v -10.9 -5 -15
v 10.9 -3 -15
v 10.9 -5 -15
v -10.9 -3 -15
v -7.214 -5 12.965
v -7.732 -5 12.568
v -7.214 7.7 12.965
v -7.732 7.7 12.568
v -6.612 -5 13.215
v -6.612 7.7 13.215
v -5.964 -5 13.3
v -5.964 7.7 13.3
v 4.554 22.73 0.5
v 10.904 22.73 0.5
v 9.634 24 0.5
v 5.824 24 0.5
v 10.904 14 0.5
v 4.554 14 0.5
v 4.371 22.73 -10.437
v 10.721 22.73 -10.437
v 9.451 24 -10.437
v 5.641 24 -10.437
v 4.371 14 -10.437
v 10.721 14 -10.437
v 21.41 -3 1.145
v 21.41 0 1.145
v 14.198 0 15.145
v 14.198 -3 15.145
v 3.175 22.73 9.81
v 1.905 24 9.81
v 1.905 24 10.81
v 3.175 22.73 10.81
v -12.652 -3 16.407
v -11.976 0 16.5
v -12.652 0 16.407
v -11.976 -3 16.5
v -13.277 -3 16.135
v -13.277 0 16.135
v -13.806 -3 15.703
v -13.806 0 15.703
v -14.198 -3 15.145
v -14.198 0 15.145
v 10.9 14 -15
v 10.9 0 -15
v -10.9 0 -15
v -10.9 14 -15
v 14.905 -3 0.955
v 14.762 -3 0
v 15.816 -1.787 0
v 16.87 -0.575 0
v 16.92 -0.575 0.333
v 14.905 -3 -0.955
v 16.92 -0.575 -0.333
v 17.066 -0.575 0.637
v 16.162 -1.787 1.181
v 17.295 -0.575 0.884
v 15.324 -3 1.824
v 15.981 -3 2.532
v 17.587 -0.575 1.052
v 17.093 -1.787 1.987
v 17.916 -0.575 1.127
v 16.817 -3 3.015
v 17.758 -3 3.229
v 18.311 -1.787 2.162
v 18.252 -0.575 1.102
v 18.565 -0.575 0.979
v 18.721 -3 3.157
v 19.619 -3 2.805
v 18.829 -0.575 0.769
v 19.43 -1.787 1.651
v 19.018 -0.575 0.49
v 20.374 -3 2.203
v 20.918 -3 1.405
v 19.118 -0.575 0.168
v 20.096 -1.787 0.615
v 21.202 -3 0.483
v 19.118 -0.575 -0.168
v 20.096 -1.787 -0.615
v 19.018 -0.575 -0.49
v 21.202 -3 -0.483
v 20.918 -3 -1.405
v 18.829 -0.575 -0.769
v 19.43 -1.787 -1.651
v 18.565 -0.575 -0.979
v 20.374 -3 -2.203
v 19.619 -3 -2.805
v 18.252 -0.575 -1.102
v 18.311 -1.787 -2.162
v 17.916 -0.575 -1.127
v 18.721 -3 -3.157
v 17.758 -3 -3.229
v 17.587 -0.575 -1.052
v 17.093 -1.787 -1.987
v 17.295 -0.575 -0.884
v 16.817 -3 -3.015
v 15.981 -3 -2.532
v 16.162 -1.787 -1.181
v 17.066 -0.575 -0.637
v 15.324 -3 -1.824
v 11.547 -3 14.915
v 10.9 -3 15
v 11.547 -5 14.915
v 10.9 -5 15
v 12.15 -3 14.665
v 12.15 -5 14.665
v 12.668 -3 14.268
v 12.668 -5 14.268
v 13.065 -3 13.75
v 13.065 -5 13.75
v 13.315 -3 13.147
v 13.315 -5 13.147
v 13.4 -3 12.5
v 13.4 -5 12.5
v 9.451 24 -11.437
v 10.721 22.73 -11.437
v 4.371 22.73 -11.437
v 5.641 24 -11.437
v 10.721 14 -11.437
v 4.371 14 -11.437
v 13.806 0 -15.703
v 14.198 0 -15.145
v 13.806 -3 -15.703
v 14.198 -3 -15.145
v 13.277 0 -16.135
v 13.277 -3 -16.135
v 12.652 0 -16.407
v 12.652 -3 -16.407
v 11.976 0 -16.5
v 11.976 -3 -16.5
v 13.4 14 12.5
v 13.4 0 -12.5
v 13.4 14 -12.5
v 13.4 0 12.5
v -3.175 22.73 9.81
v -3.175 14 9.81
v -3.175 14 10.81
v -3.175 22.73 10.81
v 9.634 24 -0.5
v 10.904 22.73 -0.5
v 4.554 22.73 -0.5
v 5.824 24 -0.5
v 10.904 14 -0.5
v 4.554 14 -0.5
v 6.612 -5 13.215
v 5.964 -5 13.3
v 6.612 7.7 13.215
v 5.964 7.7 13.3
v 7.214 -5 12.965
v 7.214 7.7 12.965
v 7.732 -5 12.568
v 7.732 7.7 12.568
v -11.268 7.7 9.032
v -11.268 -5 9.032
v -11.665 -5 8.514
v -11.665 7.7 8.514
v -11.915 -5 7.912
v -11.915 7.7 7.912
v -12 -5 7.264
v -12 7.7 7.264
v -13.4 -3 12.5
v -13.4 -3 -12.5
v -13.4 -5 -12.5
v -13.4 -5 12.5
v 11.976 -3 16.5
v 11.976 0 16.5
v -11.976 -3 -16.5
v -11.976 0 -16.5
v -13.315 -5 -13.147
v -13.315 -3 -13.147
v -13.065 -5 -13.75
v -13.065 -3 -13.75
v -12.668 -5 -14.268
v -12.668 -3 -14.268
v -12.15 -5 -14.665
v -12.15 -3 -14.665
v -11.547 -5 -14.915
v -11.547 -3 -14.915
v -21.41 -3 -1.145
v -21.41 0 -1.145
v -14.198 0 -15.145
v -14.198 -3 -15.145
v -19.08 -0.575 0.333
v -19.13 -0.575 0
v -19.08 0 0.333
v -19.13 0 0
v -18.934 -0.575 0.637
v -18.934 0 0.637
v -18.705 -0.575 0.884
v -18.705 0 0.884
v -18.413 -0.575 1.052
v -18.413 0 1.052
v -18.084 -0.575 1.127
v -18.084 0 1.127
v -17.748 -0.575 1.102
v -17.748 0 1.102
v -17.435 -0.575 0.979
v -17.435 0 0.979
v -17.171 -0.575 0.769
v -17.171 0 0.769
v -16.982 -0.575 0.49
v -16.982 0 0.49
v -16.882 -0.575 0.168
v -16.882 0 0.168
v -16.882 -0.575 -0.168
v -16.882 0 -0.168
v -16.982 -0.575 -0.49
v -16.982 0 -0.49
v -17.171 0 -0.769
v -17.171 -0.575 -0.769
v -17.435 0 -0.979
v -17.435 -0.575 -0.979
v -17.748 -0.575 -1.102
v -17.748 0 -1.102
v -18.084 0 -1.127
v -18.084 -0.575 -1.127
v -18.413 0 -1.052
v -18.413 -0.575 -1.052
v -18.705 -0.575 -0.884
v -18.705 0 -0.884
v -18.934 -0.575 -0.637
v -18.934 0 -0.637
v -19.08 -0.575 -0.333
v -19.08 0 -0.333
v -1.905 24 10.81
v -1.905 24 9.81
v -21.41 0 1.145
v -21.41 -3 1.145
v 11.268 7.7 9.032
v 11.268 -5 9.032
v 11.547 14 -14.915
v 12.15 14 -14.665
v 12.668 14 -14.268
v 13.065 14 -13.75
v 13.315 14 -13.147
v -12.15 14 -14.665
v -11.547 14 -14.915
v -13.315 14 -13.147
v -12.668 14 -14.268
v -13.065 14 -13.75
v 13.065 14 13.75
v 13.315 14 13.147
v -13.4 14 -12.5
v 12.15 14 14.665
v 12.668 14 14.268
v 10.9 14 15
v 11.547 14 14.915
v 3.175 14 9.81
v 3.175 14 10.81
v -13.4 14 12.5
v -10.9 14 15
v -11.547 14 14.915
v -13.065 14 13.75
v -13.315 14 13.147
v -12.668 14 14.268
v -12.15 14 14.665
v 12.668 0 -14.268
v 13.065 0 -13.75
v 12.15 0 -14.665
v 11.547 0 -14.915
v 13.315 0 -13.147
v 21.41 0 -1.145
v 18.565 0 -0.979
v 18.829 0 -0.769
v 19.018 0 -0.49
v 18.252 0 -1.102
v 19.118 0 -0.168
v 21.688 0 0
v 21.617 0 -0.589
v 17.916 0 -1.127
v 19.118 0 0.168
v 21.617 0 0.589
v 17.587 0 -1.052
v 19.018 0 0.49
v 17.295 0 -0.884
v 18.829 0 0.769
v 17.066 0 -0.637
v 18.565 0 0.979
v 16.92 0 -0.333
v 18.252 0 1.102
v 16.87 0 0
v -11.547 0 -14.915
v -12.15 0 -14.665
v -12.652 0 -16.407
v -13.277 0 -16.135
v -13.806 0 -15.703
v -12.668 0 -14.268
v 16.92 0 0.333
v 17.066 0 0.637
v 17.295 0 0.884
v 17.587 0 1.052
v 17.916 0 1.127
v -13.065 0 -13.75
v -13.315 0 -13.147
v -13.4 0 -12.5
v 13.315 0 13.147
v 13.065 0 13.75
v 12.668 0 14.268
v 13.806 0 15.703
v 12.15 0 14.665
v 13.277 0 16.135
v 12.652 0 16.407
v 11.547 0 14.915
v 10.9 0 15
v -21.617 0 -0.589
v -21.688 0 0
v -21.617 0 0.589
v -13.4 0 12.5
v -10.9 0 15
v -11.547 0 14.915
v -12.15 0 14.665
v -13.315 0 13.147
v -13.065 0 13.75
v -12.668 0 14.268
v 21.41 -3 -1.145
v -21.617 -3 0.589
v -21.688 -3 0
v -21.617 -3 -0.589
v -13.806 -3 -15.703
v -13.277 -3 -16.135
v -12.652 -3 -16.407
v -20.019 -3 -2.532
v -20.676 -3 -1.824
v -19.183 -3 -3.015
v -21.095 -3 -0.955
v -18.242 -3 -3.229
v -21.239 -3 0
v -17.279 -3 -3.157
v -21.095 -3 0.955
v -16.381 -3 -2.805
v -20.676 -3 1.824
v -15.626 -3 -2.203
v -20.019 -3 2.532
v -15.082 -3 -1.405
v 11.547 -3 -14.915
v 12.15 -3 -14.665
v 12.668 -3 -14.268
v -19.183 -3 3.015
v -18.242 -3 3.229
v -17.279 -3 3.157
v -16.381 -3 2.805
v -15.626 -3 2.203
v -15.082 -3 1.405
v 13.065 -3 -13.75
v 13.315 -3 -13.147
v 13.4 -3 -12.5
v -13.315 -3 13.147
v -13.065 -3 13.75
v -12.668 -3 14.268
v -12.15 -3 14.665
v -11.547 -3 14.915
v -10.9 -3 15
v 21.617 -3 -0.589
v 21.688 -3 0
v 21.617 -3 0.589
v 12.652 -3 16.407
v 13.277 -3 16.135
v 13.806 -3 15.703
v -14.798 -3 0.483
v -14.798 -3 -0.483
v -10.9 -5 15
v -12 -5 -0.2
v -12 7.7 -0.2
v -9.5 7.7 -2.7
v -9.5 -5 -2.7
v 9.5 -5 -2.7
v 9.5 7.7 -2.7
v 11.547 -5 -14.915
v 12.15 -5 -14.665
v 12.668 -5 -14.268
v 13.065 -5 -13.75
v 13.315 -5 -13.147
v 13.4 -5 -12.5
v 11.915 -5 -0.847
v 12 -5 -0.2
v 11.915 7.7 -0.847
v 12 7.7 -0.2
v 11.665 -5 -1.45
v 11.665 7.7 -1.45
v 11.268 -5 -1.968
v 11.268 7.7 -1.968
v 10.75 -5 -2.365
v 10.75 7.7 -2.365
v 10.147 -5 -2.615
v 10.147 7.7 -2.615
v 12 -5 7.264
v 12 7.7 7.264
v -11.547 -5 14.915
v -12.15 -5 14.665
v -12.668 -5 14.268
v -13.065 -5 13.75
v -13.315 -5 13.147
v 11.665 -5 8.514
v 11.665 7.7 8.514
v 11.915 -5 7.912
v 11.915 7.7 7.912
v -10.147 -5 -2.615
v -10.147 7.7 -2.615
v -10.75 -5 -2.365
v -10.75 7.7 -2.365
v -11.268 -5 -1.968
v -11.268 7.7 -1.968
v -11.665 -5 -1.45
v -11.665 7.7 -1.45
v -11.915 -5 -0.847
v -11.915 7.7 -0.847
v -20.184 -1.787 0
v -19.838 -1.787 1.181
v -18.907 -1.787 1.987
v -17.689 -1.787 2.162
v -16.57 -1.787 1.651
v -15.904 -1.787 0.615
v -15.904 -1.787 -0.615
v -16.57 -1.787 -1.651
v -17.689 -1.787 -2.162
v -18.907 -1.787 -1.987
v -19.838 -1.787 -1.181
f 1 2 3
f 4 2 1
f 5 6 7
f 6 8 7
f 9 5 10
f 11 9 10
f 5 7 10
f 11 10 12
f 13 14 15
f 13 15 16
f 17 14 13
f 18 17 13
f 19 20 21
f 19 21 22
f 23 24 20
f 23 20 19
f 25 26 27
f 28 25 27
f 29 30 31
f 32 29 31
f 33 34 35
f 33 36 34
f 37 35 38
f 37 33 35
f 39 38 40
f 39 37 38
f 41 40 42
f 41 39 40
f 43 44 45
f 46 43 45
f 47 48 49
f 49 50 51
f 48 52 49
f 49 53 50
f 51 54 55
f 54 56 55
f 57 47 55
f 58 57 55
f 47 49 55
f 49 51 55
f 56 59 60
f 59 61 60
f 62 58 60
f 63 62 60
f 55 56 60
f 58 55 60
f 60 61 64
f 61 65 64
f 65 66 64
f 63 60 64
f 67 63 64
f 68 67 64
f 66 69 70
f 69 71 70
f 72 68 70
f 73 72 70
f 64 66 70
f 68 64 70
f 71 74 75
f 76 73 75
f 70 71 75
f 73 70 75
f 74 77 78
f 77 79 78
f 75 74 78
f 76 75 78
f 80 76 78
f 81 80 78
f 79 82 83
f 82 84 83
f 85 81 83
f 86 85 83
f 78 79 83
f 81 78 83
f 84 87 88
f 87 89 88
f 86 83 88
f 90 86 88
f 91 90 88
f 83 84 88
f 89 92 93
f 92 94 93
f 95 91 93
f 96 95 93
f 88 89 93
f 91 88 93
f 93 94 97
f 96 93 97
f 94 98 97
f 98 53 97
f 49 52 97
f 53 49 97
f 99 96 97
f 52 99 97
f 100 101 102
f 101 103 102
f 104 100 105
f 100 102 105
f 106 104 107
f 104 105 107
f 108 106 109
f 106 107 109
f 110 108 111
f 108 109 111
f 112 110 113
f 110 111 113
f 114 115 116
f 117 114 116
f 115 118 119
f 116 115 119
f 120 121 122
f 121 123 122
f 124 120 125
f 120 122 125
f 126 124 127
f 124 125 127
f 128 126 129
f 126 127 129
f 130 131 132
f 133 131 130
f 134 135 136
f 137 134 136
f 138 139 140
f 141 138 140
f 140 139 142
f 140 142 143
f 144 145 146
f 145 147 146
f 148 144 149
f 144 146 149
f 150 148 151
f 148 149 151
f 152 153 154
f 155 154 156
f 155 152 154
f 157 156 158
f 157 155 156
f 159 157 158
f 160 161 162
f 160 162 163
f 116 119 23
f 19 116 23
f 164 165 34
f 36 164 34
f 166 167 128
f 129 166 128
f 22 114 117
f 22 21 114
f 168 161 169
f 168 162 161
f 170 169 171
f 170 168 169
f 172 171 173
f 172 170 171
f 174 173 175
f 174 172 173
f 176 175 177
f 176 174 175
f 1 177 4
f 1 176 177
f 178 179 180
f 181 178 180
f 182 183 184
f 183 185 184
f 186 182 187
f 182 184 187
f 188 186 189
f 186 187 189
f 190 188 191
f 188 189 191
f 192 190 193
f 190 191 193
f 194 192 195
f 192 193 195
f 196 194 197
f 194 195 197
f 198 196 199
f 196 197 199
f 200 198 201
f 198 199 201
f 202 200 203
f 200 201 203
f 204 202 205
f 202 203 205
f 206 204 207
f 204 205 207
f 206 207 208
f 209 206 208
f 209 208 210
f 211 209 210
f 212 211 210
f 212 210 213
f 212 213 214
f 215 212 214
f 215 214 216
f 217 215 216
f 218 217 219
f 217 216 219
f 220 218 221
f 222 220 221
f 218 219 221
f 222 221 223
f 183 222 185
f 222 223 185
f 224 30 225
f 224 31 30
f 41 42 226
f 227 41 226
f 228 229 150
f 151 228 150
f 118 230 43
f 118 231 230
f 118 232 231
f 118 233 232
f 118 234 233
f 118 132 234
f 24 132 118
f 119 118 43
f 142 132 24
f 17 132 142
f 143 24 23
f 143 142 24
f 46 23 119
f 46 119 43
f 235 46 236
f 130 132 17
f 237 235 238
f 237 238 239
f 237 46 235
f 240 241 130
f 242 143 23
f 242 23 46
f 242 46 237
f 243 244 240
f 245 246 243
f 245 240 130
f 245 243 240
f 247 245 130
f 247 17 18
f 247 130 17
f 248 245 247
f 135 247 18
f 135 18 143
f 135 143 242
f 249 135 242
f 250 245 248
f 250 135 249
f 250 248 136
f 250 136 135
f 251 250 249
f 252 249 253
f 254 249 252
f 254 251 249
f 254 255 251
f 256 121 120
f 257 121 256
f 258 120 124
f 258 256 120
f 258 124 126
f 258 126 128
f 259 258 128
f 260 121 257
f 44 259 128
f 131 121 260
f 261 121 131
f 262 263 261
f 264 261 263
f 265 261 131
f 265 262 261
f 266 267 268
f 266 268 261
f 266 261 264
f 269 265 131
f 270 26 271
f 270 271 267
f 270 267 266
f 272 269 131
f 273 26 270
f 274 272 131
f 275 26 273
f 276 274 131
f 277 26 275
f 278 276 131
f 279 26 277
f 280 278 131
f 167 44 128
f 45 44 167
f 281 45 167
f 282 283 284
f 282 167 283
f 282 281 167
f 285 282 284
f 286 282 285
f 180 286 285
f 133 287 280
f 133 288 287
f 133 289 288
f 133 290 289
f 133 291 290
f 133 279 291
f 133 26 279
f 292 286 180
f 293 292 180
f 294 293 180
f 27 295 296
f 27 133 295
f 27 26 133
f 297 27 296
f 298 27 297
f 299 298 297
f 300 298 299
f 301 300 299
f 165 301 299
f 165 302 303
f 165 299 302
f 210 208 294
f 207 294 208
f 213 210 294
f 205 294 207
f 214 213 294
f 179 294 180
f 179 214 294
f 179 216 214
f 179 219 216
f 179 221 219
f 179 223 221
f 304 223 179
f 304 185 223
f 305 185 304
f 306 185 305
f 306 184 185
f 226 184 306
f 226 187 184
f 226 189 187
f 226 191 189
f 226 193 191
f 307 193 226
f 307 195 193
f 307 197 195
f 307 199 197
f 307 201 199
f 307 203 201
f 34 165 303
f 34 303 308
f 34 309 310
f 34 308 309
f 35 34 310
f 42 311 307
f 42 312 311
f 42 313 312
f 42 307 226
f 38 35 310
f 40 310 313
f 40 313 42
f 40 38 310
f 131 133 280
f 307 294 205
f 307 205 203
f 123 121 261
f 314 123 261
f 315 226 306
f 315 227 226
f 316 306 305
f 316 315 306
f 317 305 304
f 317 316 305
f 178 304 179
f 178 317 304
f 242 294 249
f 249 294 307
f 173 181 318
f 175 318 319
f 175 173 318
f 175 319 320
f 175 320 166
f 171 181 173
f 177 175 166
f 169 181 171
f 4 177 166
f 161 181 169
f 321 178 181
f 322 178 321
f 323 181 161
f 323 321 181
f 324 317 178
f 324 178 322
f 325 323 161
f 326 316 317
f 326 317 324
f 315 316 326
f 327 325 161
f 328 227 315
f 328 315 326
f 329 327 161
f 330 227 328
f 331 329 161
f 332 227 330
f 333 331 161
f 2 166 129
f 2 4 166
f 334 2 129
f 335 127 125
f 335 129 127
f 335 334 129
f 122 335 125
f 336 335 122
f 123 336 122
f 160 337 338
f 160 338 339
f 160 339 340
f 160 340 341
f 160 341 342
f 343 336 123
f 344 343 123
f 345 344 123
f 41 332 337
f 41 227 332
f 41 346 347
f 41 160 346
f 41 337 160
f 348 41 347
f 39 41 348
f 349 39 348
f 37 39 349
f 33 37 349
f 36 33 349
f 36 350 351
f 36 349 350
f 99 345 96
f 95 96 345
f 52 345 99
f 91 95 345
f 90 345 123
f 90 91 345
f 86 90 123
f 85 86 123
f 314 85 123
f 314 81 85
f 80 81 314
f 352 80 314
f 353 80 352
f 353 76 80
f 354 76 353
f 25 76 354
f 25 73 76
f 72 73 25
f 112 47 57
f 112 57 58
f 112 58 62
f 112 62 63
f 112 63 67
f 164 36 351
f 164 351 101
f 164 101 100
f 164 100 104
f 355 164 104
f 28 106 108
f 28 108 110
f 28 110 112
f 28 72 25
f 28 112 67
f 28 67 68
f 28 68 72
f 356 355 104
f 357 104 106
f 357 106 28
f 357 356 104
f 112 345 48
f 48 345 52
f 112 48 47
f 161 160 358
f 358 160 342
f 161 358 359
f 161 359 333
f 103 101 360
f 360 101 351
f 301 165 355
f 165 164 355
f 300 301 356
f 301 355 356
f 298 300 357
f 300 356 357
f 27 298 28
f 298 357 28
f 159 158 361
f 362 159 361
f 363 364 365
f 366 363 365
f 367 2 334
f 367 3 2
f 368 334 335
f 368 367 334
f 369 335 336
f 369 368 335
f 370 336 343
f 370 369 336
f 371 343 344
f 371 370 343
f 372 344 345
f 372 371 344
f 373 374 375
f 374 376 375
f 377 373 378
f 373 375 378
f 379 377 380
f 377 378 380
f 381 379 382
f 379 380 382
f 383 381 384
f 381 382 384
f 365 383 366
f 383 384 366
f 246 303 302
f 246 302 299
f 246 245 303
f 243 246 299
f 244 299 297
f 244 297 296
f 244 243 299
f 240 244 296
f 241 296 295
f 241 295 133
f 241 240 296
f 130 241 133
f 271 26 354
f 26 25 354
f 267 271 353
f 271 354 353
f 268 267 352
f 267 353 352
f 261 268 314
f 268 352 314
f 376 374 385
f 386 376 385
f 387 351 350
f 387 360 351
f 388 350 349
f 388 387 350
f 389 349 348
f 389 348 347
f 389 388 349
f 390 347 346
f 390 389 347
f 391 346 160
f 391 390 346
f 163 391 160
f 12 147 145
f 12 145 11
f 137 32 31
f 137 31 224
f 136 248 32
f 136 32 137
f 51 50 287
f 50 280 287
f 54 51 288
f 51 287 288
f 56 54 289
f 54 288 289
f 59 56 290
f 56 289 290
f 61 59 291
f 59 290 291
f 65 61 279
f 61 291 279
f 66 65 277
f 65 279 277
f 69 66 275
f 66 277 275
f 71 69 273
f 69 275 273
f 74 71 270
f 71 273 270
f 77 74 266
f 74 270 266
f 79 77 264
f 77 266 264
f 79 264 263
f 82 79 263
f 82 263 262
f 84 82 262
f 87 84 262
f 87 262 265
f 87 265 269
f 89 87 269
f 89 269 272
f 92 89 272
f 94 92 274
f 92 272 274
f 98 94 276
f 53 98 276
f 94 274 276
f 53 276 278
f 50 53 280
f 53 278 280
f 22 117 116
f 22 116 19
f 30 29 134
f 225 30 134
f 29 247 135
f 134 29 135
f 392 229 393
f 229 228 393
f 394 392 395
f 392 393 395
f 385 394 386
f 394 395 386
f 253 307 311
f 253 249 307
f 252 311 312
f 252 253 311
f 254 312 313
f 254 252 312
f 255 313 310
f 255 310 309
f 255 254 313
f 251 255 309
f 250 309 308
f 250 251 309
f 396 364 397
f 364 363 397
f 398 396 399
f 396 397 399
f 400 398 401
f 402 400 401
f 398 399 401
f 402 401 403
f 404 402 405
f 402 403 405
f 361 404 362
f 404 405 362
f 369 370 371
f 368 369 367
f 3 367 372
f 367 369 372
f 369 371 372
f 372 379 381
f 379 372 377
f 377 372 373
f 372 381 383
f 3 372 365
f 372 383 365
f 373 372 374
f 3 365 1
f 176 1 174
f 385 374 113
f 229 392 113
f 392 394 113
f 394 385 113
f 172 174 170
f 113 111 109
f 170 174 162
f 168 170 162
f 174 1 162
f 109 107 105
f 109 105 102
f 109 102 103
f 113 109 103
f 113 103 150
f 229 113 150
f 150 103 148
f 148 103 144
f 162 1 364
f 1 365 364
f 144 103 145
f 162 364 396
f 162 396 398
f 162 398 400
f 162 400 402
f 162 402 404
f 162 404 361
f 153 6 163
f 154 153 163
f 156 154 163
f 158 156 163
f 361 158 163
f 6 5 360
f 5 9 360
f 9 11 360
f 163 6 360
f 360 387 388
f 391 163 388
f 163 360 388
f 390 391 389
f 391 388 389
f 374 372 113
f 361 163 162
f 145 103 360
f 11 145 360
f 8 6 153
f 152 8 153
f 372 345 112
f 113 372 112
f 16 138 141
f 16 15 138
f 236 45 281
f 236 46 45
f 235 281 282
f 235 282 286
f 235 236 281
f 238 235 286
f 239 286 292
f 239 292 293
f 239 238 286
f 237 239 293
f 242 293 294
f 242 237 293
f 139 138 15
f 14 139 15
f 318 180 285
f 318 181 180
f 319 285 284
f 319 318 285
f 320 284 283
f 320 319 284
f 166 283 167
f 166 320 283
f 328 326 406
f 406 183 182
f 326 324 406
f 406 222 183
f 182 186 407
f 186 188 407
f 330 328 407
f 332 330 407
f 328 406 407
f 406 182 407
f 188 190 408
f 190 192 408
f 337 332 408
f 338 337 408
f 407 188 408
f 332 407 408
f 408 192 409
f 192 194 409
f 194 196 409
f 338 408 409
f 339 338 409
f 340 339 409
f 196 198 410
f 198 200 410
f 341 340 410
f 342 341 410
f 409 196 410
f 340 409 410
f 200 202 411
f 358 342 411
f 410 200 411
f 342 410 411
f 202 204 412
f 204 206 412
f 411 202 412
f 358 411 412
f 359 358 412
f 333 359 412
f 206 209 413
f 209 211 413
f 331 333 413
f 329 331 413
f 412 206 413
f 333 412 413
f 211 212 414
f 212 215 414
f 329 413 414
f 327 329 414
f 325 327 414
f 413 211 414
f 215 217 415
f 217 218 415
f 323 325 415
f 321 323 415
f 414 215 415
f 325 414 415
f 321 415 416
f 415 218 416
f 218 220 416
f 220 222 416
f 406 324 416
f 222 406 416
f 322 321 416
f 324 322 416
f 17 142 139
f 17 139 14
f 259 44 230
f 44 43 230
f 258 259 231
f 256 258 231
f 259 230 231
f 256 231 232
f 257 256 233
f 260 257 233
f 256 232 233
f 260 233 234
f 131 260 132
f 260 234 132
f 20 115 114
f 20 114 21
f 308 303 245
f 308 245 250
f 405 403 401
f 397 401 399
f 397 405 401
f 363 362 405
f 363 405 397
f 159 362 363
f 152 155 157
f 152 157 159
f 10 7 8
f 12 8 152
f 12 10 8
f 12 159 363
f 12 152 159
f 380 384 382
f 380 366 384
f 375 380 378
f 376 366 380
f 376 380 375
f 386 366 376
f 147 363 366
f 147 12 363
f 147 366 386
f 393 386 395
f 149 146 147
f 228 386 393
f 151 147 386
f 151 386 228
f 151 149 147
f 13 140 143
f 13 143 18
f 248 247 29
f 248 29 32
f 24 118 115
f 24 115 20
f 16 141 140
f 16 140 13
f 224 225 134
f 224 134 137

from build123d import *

# Parameters (mm, degrees)
F1_DEPTH        = 3
F2_W            = 26.8
F2_H            = 30
F3_DEPTH        = 5
F4_W            = 26.8
F4_H            = 30
F5_DEPTH        = 14
F7_DEPTH        = 12.7
F8_W            = 6.35
F8_H            = 1
F9_DEPTH        = 10
F10_R           = 2.5
F11_SIZE        = 1.27
F13_D           = 2.2606
F13_DEPTH       = 14.61135
F13_CSINK_D     = 6.477
F13_CSINK_ANGLE = 82
F13_TIP         = 0.6791527577


with BuildPart() as f1:
    # F0 (on Front) → F1 (new body)
    with BuildSketch(Plane.XZ):
        Polygon((13.5, 16.5), (-13.5, 16.5), (-22, 0), (-13.5, -16.5), (13.5, -16.5), (22, 0), align=None)
    extrude(amount=F1_DEPTH)

    # F2 (on face) → F3 (join)
    with BuildSketch(Plane(origin=(0, 0, 0), x_dir=(-1, 0, 0), z_dir=(0, 1, 0))):
        Rectangle(F2_W, F2_H)
    extrude(amount=-F3_DEPTH)

    # F4 (on face) → F5 (join)
    with BuildSketch(Plane(origin=(0, 0, 0), x_dir=(-1, 0, 0), z_dir=(0, 1, 0))):
        Rectangle(F4_W, F4_H)
    extrude(amount=F5_DEPTH)

    # F6 (on face) → F7 (cut)
    with BuildSketch(Plane.XZ.offset(5)):
        Polygon((-12, 8.3), (-12, -2.7), (12, -2.7), (12, 8.3), (7, 13.3), (-7, 13.3), align=None)
    extrude(amount=-F7_DEPTH, mode=Mode.SUBTRACT)

    # F8 (on face) → F9 (join)
    with BuildSketch(Plane(origin=(0, 14, 0), x_dir=(-1, 0, 0), z_dir=(0, 1, 0))):
        with Locations((0, 10.3100380624)):
            Rectangle(F8_W, F8_H)
        with Locations((-7.7292244386, 0)):
            Rectangle(F8_W, F8_H)
        with Locations((-7.5456485327, -10.9369392929)):
            Rectangle(F8_W, F8_H)
    extrude(amount=F9_DEPTH)

    # F10
    f10_edges = [f1.edges().sort_by_distance(p)[0] for p in [
        (-22, -1.5, 0),
        (-13.5, -1.5, 16.5),
        (13.5, -1.5, 16.5),
        (22, -1.5, 0),
        (13.5, -1.5, -16.5),
        (-13.5, -1.5, -16.5),
        (-13.4, -4, -15),
        (13.4, -4, -15),
        (13.4, -4, 15),
        (-13.4, -4, 15),
        (-13.4, 7, 15),
        (13.4, 7, 15),
        (-13.4, 7, -15),
        (13.4, 7, -15),
        (-12, 1.35, 8.3),
        (-7, 1.35, 13.3),
        (7, 1.35, 13.3),
        (12, 1.35, 8.3),
        (12, 1.35, -2.7),
        (-12, 1.35, -2.7),
    ]]
    fillet(f10_edges, radius=F10_R)

    # F11
    f11_edges = [f1.edges().sort_by_distance(p)[0] for p in [
        (10.720649, 24, -10.936939),
        (10.904224, 24, 0),
        (3.175, 24, 10.310038),
        (-3.175, 24, 10.310038),
        (4.554224, 24, 0),
        (4.370649, 24, -10.936939),
    ]]
    chamfer(f11_edges, length=F11_SIZE)

    # F13
    with Locations(Plane.XZ.offset(3)):
        with Locations((-18, 0), (18, 0)):
            CounterSinkHole(F13_D / 2, F13_CSINK_D / 2, depth=F13_DEPTH, counter_sink_angle=F13_CSINK_ANGLE)
            with Locations((0, 0, -(F13_DEPTH + F13_TIP / 2))):  # 118° drill point
                Cone(0, F13_D / 2, F13_TIP, mode=Mode.SUBTRACT)


solid = f1.part
